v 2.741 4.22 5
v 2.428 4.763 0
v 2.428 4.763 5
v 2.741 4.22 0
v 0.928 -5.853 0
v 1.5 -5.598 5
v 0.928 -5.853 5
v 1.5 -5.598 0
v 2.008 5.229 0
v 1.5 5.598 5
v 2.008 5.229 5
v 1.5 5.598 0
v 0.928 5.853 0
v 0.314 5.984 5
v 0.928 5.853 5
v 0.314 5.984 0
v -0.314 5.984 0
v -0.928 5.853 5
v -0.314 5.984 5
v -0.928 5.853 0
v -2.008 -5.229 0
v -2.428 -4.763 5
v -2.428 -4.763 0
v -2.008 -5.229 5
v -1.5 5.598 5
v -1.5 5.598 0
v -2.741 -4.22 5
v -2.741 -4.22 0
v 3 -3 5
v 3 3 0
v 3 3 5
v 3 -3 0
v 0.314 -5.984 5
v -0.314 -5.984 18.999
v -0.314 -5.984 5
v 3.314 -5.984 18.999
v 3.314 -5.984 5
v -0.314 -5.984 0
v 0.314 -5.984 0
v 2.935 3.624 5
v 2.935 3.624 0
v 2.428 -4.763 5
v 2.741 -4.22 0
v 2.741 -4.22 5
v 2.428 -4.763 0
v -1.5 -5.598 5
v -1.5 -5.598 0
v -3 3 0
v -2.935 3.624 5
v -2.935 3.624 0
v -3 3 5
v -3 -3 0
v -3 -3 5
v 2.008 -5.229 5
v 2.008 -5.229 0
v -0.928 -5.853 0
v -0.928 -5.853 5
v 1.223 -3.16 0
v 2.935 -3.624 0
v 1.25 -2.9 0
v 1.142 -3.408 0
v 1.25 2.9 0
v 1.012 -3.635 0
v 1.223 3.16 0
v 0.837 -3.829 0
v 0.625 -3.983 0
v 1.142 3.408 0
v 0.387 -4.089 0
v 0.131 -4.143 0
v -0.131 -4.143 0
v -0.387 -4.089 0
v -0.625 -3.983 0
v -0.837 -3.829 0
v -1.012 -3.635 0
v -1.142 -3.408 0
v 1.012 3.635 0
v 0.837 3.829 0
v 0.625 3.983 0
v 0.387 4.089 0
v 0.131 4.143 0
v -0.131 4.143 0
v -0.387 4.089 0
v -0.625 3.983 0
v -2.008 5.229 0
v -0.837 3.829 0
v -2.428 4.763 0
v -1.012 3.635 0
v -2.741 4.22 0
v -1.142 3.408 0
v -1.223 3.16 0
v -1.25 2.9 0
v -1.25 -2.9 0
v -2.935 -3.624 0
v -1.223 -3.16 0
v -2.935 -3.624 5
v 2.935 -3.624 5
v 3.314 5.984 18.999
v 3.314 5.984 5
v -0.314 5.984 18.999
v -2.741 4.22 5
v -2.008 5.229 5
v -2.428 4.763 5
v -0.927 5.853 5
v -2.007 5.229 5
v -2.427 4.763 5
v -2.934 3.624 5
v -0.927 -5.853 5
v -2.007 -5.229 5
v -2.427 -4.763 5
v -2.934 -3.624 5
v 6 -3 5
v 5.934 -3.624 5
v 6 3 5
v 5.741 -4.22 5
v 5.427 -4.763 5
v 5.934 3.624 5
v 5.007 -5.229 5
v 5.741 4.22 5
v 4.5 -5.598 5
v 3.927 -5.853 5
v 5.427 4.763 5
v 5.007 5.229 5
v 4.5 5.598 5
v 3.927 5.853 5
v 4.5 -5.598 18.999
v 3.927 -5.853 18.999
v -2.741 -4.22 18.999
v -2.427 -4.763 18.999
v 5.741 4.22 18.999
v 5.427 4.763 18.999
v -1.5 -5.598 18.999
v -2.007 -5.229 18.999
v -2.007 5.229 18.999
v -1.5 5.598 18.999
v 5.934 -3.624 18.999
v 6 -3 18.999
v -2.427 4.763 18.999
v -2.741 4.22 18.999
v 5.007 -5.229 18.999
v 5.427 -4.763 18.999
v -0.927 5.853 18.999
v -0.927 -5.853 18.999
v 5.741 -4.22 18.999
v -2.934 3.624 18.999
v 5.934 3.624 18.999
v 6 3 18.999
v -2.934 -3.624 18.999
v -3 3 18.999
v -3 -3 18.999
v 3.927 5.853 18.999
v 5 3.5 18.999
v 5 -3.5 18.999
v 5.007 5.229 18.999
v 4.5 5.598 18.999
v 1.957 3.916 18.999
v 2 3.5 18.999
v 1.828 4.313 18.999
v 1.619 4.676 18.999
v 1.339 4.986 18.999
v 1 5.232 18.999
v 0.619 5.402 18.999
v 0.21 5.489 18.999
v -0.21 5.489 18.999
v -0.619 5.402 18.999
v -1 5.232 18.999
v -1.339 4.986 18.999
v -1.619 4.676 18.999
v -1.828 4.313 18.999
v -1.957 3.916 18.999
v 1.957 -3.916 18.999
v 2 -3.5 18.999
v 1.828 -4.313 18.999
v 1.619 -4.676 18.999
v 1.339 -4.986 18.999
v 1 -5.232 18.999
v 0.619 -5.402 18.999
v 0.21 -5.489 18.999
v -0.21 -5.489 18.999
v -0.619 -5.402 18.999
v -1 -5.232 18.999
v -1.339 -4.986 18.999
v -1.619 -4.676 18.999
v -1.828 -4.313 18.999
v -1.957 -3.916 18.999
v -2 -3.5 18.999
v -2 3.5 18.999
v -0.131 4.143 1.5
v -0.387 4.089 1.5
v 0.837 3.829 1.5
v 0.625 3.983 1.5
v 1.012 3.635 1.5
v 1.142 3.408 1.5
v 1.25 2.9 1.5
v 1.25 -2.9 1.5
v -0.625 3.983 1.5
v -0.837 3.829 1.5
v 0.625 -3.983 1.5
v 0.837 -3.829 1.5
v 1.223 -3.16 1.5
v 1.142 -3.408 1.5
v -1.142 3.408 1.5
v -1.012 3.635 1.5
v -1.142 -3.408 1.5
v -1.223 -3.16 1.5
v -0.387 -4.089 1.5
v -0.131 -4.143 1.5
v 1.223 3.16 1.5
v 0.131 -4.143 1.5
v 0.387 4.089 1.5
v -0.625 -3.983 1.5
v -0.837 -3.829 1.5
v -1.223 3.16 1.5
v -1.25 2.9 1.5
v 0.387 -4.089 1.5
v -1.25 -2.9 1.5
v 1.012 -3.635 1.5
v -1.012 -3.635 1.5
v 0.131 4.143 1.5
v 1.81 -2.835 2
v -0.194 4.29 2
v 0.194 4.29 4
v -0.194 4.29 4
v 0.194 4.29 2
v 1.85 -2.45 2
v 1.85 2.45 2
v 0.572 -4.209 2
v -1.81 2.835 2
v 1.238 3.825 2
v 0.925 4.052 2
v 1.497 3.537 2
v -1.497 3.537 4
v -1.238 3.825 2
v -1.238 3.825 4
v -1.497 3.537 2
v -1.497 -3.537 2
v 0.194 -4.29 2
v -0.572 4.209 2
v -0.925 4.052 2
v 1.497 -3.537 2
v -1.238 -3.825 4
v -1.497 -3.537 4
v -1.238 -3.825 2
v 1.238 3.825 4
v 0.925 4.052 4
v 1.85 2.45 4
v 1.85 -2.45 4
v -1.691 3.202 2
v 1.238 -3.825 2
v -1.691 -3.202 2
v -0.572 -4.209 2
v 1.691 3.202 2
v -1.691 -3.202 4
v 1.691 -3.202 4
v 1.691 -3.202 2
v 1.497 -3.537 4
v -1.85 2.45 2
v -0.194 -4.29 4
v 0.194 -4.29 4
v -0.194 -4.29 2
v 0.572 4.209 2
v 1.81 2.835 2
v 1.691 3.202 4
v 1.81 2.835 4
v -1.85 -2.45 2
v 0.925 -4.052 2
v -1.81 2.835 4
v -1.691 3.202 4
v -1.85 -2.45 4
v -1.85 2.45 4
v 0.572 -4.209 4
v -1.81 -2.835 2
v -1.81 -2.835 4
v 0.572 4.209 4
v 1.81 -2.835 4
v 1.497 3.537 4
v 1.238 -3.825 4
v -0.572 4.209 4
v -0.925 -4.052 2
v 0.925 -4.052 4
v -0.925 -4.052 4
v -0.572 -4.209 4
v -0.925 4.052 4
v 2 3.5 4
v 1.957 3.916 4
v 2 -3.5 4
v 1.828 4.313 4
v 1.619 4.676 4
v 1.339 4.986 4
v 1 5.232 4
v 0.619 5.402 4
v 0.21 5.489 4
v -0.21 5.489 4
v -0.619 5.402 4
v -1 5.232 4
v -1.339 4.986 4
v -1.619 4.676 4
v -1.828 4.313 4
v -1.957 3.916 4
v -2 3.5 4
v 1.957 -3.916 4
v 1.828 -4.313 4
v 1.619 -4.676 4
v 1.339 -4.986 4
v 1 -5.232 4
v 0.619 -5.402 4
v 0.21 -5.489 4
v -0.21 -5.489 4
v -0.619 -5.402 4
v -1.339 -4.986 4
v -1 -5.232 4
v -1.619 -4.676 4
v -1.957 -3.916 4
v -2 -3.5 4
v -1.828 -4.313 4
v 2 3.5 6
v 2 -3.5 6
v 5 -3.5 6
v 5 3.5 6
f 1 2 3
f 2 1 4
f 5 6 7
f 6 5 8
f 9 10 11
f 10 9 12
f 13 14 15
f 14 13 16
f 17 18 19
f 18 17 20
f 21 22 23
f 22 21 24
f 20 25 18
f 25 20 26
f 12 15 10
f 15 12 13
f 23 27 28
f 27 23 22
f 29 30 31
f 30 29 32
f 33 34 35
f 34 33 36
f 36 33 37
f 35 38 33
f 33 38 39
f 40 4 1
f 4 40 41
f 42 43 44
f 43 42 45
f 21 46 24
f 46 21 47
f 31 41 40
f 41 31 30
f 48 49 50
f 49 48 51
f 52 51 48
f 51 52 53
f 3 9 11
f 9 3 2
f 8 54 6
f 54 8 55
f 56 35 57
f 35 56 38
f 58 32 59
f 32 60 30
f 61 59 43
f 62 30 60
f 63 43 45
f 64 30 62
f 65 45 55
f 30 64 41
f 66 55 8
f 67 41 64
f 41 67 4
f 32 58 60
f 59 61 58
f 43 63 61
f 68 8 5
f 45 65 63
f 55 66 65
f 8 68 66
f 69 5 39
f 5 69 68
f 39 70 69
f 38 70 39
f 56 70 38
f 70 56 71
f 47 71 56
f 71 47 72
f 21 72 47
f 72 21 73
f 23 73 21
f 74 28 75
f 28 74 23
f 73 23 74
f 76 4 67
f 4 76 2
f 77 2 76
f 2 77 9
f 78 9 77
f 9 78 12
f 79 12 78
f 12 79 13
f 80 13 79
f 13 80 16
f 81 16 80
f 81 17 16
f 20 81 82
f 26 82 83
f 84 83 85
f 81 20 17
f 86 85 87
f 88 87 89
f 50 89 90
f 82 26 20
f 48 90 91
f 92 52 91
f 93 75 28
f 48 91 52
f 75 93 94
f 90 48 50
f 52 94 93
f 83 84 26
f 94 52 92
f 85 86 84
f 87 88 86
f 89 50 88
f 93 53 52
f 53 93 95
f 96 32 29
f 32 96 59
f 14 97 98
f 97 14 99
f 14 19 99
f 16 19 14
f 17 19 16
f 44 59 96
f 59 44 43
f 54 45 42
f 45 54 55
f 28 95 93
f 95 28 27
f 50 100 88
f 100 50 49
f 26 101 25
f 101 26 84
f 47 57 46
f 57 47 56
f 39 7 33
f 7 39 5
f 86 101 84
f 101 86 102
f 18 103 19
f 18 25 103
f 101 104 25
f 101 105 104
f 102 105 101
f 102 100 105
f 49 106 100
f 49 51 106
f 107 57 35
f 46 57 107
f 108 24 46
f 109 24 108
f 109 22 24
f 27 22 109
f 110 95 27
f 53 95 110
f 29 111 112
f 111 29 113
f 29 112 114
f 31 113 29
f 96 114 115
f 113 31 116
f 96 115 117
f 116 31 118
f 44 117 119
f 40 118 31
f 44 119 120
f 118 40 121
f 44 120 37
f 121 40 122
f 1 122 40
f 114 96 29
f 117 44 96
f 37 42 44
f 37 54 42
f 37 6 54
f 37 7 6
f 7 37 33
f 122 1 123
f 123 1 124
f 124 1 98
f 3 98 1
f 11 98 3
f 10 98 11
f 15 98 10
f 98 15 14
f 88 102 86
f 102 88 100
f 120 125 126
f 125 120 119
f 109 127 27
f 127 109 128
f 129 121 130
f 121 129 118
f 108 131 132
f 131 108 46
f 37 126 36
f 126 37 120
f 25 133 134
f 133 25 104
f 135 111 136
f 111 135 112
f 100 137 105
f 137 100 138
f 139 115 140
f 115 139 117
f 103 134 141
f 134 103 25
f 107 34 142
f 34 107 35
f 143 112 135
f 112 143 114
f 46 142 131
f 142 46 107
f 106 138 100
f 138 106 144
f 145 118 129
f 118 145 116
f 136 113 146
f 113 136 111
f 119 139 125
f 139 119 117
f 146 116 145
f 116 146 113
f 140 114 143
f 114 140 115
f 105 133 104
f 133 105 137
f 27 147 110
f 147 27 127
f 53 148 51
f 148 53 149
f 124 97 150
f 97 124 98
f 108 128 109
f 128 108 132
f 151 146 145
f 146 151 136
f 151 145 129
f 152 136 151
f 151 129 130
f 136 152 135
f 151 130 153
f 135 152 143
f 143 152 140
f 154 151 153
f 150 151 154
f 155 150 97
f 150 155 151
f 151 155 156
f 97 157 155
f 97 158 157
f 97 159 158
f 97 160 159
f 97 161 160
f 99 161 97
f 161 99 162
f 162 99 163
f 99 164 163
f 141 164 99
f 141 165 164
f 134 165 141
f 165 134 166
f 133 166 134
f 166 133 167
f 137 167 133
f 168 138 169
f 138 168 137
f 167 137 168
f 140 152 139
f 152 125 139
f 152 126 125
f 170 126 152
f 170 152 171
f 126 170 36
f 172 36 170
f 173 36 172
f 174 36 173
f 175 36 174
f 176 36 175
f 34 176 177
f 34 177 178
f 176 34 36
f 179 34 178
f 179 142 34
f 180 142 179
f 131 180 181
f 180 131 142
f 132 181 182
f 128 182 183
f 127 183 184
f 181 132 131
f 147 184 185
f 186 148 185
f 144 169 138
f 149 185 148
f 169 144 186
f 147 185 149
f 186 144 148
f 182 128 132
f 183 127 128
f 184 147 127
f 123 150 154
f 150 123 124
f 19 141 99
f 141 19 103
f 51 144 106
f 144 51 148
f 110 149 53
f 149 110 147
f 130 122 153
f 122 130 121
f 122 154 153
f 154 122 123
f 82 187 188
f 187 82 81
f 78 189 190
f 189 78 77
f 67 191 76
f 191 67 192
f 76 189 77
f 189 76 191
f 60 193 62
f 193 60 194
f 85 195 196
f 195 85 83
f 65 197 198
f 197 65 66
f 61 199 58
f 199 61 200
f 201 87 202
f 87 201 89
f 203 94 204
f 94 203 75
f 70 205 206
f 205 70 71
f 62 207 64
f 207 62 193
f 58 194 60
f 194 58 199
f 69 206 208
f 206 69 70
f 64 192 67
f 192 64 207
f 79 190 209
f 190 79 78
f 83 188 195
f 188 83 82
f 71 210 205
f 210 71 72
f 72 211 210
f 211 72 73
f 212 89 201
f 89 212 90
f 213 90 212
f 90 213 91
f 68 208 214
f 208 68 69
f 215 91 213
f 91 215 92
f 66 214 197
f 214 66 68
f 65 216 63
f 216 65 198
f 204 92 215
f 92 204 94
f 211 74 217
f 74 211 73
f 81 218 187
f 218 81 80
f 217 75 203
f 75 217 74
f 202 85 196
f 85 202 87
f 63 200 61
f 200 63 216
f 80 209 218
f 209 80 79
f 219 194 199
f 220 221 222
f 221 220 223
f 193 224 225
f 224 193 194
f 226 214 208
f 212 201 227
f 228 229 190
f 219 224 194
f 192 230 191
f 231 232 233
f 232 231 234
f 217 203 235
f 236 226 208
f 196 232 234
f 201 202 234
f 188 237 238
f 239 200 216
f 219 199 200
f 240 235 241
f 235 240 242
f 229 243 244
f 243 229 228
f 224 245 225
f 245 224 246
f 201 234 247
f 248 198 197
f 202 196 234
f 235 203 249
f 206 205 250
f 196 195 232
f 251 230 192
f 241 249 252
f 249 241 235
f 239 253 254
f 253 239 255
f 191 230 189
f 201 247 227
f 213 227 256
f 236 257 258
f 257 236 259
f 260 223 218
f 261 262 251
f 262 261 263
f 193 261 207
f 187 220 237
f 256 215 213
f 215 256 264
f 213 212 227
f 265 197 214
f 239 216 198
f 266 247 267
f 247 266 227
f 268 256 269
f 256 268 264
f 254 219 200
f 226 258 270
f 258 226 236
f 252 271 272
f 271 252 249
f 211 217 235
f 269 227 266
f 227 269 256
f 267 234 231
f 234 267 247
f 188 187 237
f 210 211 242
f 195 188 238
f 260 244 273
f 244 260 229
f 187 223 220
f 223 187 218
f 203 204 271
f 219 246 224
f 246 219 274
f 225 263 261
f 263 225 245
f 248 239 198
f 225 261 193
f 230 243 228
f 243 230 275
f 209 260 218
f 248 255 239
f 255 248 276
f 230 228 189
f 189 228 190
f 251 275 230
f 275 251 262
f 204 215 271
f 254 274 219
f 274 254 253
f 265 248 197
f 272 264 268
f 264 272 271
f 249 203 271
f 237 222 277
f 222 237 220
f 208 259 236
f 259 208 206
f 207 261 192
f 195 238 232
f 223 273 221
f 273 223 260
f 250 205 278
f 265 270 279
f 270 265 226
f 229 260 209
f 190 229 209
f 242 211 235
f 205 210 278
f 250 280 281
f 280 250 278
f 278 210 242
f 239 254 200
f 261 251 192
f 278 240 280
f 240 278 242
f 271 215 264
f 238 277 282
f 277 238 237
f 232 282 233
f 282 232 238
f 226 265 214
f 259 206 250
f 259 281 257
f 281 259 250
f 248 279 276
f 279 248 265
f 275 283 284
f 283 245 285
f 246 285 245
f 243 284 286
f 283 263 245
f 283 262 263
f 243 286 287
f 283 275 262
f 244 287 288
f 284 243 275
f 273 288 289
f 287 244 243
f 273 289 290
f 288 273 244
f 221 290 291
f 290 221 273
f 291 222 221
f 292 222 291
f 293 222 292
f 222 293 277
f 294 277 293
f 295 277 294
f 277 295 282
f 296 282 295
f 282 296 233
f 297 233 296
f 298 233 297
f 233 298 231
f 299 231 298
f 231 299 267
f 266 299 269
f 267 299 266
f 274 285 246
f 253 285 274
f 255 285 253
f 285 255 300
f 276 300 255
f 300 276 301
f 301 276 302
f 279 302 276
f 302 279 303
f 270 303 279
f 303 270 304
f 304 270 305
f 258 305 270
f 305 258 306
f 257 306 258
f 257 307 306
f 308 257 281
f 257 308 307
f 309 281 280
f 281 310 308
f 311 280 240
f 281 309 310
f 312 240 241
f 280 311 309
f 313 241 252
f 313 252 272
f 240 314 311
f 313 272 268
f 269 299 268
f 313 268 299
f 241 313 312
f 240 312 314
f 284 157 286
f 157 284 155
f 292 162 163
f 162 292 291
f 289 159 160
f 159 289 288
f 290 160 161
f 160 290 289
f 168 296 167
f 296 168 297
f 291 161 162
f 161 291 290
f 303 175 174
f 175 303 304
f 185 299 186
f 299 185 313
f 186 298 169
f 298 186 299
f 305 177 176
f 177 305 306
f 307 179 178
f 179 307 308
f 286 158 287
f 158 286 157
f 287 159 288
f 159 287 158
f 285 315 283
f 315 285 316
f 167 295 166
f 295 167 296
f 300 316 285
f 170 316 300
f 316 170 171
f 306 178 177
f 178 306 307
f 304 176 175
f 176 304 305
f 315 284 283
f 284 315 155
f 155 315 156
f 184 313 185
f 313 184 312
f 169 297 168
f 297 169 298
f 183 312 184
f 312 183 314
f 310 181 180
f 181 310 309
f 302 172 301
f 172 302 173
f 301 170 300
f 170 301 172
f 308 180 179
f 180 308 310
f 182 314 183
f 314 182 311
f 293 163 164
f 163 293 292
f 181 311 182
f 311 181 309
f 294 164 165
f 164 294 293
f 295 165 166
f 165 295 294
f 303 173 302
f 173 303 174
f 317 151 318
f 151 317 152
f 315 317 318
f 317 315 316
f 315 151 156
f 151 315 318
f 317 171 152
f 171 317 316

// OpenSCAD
// https://www.amazon.co.jp/dp/B0CZ455K2C
fa=1;$fs=.2;
module rl(d,y,x=.001){
	minkowski(){circle(d=d);square([x,y-d],center=true);}
}

module plug(){
	linear_extrude(1.5)rl(2.5,8.3);
	hull(){
		translate([0,0,1.5])linear_extrude(.001)rl(2.5,8.3);
		translate([0,0,2])linear_extrude(.001)rl(3.7,8.6);
	}
	translate([0,0,2])linear_extrude(2)rl(3.7,8.6);
}

module board(){
	translate([-1.2/2,-10/2,4])cube([1.2,10,14.7]);
	translate([1.2/2,-6.9/2,6])cube([4,6.9,13]);
	translate([5.2/2,0,19])cylinder(d=5.6,h=2);
}

module boardbb(){
	translate([0,0,4])linear_extrude(15)rl(4,11);
	translate([4/2,-7/2,6])cube([3,7,13]);
	translate([5.2/2,0,19])cylinder(d=5.7,h=2);
}

module out(){
	difference(){
		union(){
			linear_extrude(5)rl(6,12);
			translate([3/2,0,5])linear_extrude(13.999)rl(6,12,3);
		}
		plug();
		#boardbb();
	}
}

out();
